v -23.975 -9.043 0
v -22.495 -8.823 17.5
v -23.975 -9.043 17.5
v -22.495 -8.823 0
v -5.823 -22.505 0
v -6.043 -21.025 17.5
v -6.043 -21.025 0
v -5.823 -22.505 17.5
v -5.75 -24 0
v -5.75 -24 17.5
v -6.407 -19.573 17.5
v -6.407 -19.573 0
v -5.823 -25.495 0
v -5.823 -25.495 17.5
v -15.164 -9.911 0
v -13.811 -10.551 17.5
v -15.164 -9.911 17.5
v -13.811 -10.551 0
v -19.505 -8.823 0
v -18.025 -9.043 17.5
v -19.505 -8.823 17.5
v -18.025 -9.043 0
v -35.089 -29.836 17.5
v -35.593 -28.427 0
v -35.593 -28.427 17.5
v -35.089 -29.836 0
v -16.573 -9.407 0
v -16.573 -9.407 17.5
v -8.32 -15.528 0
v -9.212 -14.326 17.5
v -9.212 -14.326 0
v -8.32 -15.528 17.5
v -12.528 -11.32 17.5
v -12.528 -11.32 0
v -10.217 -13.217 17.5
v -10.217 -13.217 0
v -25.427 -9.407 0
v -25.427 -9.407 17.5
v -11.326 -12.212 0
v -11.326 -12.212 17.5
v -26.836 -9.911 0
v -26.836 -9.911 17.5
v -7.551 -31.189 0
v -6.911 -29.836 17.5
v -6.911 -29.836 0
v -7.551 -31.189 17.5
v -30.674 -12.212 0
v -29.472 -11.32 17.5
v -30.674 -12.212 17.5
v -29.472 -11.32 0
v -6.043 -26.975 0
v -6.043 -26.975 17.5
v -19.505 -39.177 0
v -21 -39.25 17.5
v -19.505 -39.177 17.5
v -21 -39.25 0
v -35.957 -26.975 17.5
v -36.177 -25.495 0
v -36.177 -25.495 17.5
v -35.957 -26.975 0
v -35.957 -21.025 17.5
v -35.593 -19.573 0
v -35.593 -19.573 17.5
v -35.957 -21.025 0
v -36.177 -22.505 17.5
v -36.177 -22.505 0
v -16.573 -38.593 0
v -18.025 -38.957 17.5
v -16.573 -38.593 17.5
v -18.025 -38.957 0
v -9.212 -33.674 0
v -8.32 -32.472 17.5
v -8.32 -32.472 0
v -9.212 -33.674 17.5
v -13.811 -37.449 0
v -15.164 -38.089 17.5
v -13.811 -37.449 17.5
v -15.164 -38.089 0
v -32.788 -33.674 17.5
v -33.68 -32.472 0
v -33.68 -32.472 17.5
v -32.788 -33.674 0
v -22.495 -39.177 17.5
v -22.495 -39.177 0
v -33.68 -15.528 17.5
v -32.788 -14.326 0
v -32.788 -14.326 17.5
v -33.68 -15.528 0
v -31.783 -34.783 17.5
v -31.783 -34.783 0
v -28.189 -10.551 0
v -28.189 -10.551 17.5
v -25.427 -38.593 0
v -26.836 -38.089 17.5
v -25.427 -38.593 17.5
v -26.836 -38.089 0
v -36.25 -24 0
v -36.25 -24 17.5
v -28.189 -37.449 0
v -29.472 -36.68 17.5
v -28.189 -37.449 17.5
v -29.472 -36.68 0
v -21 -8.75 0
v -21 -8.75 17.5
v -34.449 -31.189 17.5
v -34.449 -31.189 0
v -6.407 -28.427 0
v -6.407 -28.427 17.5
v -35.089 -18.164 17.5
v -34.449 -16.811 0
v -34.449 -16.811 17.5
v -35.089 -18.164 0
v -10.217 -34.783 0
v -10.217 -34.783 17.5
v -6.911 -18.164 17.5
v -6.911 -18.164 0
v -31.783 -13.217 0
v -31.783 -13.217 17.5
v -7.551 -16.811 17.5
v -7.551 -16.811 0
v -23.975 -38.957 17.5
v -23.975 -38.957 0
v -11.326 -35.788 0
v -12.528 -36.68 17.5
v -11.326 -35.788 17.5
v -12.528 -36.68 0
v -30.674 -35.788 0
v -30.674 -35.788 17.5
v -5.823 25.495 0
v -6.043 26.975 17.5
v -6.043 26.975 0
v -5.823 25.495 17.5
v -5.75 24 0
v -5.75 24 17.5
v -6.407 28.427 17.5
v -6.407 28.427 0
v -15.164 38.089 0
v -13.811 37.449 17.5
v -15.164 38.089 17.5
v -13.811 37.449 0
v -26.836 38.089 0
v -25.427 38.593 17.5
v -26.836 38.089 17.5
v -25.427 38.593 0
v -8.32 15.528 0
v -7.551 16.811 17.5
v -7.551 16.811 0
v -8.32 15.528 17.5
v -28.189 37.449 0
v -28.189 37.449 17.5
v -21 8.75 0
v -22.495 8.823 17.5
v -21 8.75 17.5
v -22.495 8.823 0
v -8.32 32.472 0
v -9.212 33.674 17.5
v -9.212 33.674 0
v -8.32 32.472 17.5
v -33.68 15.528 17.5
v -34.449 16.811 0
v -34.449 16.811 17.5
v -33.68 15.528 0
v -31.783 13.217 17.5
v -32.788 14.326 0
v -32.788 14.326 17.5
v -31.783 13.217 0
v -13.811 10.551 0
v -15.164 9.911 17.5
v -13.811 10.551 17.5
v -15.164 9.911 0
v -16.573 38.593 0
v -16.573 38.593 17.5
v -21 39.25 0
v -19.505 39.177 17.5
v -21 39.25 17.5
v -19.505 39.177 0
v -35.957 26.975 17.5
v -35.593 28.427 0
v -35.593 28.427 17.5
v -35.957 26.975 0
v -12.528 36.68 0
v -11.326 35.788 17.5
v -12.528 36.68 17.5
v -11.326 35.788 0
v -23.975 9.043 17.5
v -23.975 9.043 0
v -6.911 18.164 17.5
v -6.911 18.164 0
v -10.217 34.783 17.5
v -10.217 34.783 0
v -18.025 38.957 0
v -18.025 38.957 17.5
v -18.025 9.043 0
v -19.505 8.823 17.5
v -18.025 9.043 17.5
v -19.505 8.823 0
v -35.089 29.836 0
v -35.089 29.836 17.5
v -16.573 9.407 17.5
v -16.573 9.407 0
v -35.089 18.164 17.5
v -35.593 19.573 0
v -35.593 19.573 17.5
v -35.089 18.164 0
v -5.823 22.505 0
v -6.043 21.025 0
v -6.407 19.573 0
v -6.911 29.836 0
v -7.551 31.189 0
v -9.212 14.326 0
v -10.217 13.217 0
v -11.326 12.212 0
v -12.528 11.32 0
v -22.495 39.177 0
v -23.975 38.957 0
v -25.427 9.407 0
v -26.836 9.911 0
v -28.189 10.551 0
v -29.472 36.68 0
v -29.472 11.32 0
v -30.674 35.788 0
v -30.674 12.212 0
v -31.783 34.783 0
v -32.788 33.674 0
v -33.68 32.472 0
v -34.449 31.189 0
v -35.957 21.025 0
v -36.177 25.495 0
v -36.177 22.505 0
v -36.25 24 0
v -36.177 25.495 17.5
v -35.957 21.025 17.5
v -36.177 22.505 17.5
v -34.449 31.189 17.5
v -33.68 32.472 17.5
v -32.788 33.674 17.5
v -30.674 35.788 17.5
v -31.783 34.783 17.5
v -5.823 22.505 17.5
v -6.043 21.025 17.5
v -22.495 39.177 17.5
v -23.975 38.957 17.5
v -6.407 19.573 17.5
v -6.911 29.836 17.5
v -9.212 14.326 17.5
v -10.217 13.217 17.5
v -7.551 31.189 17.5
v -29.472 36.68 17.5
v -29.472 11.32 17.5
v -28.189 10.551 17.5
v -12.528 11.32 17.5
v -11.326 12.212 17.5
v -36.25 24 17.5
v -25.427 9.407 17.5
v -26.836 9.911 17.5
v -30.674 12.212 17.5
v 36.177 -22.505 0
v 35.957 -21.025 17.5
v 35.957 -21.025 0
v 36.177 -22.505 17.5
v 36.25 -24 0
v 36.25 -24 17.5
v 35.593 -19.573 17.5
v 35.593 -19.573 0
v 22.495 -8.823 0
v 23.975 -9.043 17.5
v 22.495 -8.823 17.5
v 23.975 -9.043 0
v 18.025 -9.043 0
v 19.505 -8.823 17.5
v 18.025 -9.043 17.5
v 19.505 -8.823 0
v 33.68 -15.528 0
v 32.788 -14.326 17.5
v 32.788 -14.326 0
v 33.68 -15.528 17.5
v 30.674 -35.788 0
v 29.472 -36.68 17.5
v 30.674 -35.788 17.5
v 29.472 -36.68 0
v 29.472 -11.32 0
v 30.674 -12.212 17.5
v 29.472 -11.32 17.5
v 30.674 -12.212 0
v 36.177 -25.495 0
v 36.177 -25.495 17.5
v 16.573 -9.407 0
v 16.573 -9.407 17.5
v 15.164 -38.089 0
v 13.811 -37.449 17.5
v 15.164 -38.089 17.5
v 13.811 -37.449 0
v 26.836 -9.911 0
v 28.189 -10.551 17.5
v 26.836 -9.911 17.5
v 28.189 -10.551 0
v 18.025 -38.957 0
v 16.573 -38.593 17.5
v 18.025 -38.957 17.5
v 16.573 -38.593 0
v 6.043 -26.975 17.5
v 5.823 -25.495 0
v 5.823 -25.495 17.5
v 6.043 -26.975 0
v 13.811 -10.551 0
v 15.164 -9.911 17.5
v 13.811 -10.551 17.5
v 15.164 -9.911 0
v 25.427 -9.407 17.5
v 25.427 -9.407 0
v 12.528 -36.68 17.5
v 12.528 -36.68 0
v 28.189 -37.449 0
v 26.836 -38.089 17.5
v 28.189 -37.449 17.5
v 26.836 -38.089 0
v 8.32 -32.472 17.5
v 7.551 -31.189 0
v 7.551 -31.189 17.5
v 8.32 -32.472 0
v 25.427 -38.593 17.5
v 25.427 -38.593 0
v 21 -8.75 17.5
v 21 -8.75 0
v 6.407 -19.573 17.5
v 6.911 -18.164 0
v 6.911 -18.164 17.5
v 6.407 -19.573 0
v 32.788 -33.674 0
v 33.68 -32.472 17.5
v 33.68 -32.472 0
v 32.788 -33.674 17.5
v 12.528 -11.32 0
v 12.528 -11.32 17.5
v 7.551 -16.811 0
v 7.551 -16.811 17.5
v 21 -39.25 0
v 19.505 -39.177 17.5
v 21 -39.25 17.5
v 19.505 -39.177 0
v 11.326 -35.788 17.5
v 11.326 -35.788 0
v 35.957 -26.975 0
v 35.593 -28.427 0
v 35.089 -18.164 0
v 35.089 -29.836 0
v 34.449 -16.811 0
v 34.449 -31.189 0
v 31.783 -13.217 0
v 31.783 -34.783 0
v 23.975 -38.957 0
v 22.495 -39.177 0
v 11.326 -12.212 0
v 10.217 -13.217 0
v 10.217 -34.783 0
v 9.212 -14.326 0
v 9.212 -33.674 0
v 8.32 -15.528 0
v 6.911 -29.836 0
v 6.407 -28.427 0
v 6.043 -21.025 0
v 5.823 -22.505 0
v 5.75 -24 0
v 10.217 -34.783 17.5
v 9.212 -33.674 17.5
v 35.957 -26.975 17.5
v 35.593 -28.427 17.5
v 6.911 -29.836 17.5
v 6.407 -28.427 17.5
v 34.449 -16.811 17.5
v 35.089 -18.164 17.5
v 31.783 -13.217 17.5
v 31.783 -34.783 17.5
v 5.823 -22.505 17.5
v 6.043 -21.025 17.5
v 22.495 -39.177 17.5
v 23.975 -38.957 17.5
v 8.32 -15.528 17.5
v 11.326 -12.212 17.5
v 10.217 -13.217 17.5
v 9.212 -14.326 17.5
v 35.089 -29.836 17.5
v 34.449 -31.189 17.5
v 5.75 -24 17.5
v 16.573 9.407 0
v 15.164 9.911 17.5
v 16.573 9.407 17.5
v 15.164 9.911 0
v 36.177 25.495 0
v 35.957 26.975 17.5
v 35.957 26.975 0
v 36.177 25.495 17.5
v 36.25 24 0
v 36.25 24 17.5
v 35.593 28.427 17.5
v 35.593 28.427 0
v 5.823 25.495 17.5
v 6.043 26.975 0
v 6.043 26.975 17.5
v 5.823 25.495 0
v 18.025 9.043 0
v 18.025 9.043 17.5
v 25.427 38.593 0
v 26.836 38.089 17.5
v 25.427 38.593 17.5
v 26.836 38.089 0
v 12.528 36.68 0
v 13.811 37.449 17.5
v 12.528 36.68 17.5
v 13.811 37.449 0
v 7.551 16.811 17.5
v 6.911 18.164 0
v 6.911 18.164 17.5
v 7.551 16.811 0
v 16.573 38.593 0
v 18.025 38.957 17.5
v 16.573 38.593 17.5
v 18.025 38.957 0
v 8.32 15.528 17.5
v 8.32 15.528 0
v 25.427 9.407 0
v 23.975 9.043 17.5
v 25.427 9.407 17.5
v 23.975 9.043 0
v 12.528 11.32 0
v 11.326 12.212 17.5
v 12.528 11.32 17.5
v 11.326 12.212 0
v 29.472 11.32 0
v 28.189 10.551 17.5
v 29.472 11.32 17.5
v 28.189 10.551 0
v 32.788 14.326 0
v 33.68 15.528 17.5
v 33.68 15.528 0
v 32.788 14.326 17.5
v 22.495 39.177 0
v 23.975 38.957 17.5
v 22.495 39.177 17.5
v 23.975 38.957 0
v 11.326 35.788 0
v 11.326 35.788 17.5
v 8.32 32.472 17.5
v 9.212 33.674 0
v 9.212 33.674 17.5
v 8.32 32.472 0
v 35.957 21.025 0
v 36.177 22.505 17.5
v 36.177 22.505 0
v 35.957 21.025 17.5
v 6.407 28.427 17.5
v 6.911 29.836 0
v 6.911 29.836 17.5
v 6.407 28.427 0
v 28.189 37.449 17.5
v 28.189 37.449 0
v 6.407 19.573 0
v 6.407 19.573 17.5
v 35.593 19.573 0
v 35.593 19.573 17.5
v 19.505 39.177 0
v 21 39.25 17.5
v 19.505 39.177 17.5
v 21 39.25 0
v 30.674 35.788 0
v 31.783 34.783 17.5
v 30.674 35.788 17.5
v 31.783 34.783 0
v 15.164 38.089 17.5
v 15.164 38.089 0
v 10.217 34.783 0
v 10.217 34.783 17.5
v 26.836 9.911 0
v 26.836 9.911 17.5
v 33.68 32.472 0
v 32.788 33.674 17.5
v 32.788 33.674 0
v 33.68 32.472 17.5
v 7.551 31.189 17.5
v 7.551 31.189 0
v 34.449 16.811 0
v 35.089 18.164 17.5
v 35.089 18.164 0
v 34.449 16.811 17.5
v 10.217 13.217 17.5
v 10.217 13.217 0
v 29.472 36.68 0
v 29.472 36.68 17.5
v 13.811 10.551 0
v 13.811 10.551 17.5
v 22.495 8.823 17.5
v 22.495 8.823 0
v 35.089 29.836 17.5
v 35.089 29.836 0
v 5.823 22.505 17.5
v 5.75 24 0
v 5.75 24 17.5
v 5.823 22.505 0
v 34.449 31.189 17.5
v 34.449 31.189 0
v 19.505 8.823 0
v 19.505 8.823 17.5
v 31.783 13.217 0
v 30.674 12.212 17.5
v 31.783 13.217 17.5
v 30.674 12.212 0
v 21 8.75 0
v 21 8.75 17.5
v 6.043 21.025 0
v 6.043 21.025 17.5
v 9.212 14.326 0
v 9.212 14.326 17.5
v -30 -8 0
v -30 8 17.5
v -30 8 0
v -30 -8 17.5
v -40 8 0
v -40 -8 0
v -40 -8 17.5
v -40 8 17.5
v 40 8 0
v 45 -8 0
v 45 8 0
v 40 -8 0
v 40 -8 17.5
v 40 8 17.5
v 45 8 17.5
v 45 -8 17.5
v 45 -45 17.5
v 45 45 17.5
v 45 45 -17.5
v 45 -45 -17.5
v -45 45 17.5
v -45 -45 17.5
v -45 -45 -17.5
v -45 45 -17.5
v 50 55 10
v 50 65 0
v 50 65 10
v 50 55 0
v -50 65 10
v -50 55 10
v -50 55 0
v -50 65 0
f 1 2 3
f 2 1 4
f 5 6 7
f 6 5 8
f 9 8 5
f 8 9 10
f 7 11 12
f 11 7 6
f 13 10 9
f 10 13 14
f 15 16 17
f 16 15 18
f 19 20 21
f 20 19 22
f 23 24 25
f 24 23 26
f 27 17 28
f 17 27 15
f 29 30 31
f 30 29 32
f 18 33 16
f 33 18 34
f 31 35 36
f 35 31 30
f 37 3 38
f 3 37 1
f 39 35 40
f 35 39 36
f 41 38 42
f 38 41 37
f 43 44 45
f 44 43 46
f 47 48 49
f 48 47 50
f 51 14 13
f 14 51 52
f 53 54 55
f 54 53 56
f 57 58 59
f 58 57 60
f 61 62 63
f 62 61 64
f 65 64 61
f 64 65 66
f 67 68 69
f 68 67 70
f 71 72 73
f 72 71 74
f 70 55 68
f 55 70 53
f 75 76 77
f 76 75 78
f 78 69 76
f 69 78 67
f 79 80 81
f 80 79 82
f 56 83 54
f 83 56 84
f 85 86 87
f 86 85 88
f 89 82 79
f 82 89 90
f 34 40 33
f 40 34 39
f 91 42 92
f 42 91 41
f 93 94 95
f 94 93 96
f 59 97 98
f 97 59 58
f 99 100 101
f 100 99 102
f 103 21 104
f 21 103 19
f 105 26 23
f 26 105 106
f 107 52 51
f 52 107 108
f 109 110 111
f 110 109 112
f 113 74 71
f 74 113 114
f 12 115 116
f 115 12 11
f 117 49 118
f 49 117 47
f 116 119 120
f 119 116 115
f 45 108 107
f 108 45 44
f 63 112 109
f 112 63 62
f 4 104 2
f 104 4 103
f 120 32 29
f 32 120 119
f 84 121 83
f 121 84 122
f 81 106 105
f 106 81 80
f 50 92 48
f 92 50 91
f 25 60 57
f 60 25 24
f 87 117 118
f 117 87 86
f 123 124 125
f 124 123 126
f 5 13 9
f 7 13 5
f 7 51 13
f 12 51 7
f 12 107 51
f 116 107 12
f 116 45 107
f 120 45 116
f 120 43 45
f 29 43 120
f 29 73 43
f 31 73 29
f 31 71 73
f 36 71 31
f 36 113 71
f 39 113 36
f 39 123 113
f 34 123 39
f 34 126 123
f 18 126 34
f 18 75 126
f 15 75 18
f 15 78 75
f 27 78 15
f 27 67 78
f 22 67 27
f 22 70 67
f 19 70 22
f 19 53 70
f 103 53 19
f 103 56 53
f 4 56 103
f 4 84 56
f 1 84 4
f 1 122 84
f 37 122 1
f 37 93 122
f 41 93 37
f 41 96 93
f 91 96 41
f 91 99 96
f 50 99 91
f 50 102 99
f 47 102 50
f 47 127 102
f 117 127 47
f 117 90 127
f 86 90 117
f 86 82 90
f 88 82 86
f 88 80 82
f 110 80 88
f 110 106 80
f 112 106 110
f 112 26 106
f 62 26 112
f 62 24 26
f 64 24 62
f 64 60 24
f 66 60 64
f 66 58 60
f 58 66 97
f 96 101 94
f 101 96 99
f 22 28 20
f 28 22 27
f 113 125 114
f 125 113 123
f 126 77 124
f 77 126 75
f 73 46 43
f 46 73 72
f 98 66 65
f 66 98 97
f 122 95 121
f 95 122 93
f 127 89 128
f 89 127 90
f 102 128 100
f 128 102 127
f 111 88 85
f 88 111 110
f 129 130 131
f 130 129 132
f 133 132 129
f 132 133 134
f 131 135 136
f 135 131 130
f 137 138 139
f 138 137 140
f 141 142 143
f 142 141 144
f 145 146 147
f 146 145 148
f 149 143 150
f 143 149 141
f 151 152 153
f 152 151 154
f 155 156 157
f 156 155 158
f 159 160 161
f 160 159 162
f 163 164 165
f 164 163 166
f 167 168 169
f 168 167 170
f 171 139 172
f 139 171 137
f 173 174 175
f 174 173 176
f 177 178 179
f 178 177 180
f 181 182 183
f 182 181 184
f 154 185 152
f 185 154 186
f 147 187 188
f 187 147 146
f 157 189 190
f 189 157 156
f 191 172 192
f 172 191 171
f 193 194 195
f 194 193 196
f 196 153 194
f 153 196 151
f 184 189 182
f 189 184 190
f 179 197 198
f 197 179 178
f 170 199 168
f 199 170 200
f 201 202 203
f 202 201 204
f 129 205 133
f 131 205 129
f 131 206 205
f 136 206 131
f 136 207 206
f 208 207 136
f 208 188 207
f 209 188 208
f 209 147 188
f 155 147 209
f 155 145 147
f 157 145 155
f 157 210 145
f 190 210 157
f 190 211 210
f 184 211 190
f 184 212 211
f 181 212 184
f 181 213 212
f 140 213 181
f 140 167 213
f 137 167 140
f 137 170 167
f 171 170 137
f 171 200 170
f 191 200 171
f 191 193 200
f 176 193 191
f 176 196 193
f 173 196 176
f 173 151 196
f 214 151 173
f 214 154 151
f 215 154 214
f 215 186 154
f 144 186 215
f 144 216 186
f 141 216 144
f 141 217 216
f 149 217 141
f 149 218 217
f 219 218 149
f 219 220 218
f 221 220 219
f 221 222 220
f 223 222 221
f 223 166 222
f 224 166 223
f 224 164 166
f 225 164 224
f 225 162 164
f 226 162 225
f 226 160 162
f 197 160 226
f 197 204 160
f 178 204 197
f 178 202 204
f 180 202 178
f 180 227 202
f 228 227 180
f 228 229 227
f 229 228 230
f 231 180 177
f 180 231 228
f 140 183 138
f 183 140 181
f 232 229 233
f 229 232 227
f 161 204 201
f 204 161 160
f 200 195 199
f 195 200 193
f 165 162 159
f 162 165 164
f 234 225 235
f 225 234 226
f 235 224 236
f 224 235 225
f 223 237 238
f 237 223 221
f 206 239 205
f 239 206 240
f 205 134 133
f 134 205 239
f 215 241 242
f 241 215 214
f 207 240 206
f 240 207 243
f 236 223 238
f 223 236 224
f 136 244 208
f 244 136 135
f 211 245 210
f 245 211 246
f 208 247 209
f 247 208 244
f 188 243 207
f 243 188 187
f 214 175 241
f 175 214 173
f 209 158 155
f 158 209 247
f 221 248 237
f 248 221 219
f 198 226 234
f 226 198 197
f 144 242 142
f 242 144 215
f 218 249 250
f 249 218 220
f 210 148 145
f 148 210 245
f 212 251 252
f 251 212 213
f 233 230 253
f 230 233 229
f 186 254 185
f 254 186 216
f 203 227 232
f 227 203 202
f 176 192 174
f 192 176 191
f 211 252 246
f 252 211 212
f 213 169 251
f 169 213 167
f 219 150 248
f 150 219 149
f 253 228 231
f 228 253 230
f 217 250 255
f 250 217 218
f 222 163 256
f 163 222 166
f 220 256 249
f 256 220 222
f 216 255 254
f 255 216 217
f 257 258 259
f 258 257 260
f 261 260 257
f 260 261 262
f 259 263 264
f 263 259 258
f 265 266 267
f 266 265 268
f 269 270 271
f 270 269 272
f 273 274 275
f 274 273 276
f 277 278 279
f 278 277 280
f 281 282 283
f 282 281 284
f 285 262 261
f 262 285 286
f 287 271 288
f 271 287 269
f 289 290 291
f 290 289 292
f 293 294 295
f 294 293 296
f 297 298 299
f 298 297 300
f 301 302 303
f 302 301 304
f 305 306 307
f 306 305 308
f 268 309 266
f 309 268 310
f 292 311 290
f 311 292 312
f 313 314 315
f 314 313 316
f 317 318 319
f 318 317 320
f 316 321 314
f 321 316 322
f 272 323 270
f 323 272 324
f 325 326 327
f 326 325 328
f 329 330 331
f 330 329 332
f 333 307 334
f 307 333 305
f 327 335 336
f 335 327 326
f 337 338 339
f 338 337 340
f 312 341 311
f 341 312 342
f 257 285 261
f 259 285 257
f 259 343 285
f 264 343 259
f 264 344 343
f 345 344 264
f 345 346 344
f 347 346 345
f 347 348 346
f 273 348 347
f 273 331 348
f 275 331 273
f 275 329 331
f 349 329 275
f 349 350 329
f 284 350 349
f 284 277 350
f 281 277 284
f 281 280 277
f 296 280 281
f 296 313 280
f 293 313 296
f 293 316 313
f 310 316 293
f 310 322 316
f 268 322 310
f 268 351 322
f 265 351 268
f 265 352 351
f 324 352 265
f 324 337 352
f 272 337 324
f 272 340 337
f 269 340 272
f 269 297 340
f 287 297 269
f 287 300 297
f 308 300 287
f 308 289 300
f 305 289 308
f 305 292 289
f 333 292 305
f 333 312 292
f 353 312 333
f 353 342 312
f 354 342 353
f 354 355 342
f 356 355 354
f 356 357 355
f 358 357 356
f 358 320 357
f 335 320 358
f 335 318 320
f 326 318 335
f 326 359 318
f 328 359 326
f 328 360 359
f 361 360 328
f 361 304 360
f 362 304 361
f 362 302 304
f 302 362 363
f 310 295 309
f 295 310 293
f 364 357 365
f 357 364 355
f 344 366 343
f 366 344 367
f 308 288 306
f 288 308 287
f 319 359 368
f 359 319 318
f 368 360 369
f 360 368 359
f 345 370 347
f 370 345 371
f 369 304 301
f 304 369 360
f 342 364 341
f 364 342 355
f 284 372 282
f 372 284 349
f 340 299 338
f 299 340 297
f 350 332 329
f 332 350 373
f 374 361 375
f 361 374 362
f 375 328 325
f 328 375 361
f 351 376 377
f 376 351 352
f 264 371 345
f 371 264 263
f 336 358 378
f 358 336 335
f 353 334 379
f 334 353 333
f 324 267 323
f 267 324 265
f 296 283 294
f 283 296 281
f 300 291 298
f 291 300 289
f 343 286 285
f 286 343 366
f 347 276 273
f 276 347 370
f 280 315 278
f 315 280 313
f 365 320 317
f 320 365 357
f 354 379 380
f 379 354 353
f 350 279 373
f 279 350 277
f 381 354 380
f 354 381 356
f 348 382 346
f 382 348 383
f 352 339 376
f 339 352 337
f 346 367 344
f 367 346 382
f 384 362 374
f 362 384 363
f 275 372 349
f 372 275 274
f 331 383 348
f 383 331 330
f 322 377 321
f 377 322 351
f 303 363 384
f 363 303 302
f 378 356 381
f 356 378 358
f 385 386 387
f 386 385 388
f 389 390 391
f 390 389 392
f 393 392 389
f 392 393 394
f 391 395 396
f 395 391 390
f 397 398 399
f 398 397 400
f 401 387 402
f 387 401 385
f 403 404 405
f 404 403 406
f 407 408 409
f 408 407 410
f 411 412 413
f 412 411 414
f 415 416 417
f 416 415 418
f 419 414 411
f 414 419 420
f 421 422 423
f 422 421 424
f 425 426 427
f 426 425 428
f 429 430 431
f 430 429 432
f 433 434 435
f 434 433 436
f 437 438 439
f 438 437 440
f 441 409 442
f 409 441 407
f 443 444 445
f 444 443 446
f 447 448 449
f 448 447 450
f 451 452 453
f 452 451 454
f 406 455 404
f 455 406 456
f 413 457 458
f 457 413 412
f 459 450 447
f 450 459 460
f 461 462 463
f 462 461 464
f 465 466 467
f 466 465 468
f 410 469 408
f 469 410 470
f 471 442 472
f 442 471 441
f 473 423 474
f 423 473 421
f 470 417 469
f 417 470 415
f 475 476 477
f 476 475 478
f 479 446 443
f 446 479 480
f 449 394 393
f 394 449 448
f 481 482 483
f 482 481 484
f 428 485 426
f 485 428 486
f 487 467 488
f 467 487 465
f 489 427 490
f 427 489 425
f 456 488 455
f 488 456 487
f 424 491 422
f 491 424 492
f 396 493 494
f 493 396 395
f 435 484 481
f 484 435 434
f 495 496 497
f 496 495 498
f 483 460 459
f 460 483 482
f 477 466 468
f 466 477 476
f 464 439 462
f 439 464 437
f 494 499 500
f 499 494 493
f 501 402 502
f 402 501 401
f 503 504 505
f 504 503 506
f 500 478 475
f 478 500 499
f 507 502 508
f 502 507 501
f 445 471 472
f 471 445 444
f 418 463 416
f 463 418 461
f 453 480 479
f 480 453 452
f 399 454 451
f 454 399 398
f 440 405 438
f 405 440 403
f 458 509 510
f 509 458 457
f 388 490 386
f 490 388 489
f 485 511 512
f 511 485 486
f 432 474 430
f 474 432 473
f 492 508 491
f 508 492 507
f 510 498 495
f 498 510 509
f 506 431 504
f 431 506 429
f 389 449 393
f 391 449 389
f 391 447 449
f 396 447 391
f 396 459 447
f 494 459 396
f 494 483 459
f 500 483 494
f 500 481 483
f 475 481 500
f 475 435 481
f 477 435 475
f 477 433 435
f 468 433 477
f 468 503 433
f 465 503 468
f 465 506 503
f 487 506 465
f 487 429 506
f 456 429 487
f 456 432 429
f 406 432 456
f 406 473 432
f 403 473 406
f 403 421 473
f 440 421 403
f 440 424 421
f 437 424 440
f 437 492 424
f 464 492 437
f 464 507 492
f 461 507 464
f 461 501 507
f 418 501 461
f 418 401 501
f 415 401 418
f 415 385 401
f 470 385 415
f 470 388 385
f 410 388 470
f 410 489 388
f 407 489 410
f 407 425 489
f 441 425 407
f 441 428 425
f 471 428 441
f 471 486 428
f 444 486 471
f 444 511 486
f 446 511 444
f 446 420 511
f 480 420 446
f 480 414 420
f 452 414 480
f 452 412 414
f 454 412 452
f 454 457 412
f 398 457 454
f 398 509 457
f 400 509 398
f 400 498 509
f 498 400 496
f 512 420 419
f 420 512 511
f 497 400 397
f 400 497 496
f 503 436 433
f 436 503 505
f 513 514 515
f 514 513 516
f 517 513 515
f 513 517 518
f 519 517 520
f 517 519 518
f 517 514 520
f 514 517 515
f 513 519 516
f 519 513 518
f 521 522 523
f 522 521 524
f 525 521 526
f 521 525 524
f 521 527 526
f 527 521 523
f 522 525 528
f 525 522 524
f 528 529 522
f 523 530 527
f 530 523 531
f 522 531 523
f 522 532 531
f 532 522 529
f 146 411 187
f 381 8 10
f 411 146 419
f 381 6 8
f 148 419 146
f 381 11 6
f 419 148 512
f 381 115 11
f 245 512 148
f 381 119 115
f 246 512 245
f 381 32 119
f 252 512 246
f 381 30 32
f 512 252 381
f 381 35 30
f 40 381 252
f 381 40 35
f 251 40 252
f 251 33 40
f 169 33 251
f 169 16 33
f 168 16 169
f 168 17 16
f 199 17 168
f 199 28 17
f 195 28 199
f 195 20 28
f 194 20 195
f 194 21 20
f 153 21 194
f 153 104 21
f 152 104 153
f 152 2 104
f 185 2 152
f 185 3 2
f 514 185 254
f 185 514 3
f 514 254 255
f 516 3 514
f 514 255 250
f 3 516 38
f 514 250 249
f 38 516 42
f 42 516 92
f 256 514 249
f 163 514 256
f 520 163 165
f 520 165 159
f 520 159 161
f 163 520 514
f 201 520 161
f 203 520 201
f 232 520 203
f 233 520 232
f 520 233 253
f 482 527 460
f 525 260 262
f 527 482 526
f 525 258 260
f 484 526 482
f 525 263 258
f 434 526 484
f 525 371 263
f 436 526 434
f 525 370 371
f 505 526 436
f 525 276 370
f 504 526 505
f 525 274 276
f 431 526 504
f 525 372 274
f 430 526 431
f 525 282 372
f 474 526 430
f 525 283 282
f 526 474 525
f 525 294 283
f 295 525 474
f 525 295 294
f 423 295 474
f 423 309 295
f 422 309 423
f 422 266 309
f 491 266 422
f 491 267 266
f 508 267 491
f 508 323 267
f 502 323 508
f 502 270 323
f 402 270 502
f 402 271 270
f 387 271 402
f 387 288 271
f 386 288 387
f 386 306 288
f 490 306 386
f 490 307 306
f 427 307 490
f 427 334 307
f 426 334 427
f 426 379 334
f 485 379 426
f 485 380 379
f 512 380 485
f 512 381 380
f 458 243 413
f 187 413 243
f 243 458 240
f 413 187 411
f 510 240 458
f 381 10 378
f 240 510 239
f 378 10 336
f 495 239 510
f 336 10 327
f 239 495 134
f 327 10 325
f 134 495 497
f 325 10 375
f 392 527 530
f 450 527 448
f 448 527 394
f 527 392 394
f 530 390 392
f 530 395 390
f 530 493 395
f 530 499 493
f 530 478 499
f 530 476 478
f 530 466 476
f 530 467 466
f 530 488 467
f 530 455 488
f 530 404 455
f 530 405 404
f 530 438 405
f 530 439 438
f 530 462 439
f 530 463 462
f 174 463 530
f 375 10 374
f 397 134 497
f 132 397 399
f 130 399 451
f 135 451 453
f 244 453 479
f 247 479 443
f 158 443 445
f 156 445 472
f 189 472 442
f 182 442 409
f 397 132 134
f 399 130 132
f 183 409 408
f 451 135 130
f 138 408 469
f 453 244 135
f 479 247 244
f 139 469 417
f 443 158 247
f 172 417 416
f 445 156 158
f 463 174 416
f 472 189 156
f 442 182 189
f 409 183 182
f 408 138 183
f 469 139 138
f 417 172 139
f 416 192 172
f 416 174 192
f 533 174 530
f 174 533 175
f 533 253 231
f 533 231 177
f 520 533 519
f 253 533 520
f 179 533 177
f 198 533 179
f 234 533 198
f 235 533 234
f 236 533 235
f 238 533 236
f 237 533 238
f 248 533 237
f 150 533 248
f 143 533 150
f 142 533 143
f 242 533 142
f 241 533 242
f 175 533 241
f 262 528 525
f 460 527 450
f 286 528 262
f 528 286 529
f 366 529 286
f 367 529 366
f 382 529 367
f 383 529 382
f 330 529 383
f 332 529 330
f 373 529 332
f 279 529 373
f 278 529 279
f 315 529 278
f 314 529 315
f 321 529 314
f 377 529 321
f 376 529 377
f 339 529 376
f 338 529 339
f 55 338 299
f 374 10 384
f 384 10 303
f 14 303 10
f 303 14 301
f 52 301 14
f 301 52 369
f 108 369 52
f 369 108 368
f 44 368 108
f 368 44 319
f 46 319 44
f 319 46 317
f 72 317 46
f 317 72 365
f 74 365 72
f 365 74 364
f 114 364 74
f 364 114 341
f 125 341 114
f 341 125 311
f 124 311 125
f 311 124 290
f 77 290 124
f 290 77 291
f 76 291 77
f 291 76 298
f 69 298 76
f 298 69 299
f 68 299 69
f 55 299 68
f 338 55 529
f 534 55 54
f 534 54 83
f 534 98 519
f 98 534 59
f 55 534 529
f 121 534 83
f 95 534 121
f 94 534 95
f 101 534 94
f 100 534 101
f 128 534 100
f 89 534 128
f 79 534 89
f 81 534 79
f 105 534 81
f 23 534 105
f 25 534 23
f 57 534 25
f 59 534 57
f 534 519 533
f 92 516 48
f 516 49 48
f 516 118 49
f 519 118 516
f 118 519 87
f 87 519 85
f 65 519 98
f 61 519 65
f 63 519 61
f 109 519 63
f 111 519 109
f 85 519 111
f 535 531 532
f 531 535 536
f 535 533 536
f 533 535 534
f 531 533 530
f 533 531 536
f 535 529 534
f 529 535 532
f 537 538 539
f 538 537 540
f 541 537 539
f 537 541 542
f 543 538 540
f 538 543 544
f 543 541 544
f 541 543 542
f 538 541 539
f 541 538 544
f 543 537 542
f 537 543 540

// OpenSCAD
// Dimensions for Part 1: Base Block
base_x = 90;
base_y = 90;
base_z = 35;

// Dimensions for Part 1: Tube Seats
seat_dia = 30.5;
seat_depth = 30;
seat_floor = 5; // base_z - seat_depth
seat_x_pos = 21;
seat_y_pos = 24;

// Dimensions for Part 1: Posts
post_x = 10;
post_y = 16;
post_z = 160;
post_hole_x = 10.4;
post_hole_y = 10.4;
post_hole_z = 150;

// Dimensions for Part 2: Handle
handle_x = 100;
handle_y = 10;
handle_z = 10;
handle_y_start = 55;
handle_y_end = 65;

// Global settings
$fn = 64;

// --- Part 1: Base Block ---
// Centered on origin in X and Y, resting on z=0
// The base block is 90x90x35, centered at (0,0,0) in XY, so it spans X: -45..45, Y: -45..45, Z: 0..35
difference() {
    // Main base block
    translate([0, 0, 0])
        cube([base_x, base_y, base_z], center = true);
    
    // Four blind seats for 50 mL tubes
    // Seats are 30.5mm dia, 30mm deep. Floor is 5mm thick (35-30=5).
    // Centers at x = -21, 21 and y = -24, 24.
    for (sx = [-seat_x_pos, seat_x_pos]) {
        for (sy = [-seat_y_pos, seat_y_pos]) {
            translate([sx, sy, 0]) {
                cylinder(r = seat_dia / 2, h = seat_depth + 1, center = false);
            }
        }
    }
    
    // Two posts
    // Posts are 10mm thick (X) and 16mm wide (Y).
    // They stand on the base at its two X ends, flush with the end faces.
    // Base X ends are at -45 and 45.
    // Post X center should be at -45 + 5 = -40 and 45 - 5 = 40.
    // Posts are centred on y = 0.
    // Posts rise to z = 160. Since base is 0..35, posts start at z=0? 
    // "stand on the base... and rise to z=160". This implies the post top is at z=160.
    // The post height is 160. It sits on the base (z=0). So it spans z=0 to z=160.
    for (px = [-base_x/2 + post_x/2, base_x/2 - post_x/2]) {
        translate([px, -post_y/2, 0]) {
            cube([post_x, post_y, post_z], center = false);
            
            // Square hole through post along X axis
            // Hole is 10.4 x 10.4 mm.
            // Centred at z = 150.
            // Centred on Y (post is centered on Y=0, so hole is centered on Y=0).
            // Hole goes straight through along X.
            translate([post_x/2, -post_hole_y/2, post_hole_z - post_hole_y/2]) {
                cube([post_x + 1, post_hole_y, post_hole_y + 1], center = false);
            }
        }
    }
}

// --- Part 2: Handle ---
// Square bar 10 x 10 mm and 100 mm long.
// Lying on the bed along X and centred on x = 0.
// Spans y = 55 to 65.
// Resting on z=0.
translate([-handle_x/2, handle_y_start, 0]) {
    cube([handle_x, handle_y, handle_z], center = false);
}
